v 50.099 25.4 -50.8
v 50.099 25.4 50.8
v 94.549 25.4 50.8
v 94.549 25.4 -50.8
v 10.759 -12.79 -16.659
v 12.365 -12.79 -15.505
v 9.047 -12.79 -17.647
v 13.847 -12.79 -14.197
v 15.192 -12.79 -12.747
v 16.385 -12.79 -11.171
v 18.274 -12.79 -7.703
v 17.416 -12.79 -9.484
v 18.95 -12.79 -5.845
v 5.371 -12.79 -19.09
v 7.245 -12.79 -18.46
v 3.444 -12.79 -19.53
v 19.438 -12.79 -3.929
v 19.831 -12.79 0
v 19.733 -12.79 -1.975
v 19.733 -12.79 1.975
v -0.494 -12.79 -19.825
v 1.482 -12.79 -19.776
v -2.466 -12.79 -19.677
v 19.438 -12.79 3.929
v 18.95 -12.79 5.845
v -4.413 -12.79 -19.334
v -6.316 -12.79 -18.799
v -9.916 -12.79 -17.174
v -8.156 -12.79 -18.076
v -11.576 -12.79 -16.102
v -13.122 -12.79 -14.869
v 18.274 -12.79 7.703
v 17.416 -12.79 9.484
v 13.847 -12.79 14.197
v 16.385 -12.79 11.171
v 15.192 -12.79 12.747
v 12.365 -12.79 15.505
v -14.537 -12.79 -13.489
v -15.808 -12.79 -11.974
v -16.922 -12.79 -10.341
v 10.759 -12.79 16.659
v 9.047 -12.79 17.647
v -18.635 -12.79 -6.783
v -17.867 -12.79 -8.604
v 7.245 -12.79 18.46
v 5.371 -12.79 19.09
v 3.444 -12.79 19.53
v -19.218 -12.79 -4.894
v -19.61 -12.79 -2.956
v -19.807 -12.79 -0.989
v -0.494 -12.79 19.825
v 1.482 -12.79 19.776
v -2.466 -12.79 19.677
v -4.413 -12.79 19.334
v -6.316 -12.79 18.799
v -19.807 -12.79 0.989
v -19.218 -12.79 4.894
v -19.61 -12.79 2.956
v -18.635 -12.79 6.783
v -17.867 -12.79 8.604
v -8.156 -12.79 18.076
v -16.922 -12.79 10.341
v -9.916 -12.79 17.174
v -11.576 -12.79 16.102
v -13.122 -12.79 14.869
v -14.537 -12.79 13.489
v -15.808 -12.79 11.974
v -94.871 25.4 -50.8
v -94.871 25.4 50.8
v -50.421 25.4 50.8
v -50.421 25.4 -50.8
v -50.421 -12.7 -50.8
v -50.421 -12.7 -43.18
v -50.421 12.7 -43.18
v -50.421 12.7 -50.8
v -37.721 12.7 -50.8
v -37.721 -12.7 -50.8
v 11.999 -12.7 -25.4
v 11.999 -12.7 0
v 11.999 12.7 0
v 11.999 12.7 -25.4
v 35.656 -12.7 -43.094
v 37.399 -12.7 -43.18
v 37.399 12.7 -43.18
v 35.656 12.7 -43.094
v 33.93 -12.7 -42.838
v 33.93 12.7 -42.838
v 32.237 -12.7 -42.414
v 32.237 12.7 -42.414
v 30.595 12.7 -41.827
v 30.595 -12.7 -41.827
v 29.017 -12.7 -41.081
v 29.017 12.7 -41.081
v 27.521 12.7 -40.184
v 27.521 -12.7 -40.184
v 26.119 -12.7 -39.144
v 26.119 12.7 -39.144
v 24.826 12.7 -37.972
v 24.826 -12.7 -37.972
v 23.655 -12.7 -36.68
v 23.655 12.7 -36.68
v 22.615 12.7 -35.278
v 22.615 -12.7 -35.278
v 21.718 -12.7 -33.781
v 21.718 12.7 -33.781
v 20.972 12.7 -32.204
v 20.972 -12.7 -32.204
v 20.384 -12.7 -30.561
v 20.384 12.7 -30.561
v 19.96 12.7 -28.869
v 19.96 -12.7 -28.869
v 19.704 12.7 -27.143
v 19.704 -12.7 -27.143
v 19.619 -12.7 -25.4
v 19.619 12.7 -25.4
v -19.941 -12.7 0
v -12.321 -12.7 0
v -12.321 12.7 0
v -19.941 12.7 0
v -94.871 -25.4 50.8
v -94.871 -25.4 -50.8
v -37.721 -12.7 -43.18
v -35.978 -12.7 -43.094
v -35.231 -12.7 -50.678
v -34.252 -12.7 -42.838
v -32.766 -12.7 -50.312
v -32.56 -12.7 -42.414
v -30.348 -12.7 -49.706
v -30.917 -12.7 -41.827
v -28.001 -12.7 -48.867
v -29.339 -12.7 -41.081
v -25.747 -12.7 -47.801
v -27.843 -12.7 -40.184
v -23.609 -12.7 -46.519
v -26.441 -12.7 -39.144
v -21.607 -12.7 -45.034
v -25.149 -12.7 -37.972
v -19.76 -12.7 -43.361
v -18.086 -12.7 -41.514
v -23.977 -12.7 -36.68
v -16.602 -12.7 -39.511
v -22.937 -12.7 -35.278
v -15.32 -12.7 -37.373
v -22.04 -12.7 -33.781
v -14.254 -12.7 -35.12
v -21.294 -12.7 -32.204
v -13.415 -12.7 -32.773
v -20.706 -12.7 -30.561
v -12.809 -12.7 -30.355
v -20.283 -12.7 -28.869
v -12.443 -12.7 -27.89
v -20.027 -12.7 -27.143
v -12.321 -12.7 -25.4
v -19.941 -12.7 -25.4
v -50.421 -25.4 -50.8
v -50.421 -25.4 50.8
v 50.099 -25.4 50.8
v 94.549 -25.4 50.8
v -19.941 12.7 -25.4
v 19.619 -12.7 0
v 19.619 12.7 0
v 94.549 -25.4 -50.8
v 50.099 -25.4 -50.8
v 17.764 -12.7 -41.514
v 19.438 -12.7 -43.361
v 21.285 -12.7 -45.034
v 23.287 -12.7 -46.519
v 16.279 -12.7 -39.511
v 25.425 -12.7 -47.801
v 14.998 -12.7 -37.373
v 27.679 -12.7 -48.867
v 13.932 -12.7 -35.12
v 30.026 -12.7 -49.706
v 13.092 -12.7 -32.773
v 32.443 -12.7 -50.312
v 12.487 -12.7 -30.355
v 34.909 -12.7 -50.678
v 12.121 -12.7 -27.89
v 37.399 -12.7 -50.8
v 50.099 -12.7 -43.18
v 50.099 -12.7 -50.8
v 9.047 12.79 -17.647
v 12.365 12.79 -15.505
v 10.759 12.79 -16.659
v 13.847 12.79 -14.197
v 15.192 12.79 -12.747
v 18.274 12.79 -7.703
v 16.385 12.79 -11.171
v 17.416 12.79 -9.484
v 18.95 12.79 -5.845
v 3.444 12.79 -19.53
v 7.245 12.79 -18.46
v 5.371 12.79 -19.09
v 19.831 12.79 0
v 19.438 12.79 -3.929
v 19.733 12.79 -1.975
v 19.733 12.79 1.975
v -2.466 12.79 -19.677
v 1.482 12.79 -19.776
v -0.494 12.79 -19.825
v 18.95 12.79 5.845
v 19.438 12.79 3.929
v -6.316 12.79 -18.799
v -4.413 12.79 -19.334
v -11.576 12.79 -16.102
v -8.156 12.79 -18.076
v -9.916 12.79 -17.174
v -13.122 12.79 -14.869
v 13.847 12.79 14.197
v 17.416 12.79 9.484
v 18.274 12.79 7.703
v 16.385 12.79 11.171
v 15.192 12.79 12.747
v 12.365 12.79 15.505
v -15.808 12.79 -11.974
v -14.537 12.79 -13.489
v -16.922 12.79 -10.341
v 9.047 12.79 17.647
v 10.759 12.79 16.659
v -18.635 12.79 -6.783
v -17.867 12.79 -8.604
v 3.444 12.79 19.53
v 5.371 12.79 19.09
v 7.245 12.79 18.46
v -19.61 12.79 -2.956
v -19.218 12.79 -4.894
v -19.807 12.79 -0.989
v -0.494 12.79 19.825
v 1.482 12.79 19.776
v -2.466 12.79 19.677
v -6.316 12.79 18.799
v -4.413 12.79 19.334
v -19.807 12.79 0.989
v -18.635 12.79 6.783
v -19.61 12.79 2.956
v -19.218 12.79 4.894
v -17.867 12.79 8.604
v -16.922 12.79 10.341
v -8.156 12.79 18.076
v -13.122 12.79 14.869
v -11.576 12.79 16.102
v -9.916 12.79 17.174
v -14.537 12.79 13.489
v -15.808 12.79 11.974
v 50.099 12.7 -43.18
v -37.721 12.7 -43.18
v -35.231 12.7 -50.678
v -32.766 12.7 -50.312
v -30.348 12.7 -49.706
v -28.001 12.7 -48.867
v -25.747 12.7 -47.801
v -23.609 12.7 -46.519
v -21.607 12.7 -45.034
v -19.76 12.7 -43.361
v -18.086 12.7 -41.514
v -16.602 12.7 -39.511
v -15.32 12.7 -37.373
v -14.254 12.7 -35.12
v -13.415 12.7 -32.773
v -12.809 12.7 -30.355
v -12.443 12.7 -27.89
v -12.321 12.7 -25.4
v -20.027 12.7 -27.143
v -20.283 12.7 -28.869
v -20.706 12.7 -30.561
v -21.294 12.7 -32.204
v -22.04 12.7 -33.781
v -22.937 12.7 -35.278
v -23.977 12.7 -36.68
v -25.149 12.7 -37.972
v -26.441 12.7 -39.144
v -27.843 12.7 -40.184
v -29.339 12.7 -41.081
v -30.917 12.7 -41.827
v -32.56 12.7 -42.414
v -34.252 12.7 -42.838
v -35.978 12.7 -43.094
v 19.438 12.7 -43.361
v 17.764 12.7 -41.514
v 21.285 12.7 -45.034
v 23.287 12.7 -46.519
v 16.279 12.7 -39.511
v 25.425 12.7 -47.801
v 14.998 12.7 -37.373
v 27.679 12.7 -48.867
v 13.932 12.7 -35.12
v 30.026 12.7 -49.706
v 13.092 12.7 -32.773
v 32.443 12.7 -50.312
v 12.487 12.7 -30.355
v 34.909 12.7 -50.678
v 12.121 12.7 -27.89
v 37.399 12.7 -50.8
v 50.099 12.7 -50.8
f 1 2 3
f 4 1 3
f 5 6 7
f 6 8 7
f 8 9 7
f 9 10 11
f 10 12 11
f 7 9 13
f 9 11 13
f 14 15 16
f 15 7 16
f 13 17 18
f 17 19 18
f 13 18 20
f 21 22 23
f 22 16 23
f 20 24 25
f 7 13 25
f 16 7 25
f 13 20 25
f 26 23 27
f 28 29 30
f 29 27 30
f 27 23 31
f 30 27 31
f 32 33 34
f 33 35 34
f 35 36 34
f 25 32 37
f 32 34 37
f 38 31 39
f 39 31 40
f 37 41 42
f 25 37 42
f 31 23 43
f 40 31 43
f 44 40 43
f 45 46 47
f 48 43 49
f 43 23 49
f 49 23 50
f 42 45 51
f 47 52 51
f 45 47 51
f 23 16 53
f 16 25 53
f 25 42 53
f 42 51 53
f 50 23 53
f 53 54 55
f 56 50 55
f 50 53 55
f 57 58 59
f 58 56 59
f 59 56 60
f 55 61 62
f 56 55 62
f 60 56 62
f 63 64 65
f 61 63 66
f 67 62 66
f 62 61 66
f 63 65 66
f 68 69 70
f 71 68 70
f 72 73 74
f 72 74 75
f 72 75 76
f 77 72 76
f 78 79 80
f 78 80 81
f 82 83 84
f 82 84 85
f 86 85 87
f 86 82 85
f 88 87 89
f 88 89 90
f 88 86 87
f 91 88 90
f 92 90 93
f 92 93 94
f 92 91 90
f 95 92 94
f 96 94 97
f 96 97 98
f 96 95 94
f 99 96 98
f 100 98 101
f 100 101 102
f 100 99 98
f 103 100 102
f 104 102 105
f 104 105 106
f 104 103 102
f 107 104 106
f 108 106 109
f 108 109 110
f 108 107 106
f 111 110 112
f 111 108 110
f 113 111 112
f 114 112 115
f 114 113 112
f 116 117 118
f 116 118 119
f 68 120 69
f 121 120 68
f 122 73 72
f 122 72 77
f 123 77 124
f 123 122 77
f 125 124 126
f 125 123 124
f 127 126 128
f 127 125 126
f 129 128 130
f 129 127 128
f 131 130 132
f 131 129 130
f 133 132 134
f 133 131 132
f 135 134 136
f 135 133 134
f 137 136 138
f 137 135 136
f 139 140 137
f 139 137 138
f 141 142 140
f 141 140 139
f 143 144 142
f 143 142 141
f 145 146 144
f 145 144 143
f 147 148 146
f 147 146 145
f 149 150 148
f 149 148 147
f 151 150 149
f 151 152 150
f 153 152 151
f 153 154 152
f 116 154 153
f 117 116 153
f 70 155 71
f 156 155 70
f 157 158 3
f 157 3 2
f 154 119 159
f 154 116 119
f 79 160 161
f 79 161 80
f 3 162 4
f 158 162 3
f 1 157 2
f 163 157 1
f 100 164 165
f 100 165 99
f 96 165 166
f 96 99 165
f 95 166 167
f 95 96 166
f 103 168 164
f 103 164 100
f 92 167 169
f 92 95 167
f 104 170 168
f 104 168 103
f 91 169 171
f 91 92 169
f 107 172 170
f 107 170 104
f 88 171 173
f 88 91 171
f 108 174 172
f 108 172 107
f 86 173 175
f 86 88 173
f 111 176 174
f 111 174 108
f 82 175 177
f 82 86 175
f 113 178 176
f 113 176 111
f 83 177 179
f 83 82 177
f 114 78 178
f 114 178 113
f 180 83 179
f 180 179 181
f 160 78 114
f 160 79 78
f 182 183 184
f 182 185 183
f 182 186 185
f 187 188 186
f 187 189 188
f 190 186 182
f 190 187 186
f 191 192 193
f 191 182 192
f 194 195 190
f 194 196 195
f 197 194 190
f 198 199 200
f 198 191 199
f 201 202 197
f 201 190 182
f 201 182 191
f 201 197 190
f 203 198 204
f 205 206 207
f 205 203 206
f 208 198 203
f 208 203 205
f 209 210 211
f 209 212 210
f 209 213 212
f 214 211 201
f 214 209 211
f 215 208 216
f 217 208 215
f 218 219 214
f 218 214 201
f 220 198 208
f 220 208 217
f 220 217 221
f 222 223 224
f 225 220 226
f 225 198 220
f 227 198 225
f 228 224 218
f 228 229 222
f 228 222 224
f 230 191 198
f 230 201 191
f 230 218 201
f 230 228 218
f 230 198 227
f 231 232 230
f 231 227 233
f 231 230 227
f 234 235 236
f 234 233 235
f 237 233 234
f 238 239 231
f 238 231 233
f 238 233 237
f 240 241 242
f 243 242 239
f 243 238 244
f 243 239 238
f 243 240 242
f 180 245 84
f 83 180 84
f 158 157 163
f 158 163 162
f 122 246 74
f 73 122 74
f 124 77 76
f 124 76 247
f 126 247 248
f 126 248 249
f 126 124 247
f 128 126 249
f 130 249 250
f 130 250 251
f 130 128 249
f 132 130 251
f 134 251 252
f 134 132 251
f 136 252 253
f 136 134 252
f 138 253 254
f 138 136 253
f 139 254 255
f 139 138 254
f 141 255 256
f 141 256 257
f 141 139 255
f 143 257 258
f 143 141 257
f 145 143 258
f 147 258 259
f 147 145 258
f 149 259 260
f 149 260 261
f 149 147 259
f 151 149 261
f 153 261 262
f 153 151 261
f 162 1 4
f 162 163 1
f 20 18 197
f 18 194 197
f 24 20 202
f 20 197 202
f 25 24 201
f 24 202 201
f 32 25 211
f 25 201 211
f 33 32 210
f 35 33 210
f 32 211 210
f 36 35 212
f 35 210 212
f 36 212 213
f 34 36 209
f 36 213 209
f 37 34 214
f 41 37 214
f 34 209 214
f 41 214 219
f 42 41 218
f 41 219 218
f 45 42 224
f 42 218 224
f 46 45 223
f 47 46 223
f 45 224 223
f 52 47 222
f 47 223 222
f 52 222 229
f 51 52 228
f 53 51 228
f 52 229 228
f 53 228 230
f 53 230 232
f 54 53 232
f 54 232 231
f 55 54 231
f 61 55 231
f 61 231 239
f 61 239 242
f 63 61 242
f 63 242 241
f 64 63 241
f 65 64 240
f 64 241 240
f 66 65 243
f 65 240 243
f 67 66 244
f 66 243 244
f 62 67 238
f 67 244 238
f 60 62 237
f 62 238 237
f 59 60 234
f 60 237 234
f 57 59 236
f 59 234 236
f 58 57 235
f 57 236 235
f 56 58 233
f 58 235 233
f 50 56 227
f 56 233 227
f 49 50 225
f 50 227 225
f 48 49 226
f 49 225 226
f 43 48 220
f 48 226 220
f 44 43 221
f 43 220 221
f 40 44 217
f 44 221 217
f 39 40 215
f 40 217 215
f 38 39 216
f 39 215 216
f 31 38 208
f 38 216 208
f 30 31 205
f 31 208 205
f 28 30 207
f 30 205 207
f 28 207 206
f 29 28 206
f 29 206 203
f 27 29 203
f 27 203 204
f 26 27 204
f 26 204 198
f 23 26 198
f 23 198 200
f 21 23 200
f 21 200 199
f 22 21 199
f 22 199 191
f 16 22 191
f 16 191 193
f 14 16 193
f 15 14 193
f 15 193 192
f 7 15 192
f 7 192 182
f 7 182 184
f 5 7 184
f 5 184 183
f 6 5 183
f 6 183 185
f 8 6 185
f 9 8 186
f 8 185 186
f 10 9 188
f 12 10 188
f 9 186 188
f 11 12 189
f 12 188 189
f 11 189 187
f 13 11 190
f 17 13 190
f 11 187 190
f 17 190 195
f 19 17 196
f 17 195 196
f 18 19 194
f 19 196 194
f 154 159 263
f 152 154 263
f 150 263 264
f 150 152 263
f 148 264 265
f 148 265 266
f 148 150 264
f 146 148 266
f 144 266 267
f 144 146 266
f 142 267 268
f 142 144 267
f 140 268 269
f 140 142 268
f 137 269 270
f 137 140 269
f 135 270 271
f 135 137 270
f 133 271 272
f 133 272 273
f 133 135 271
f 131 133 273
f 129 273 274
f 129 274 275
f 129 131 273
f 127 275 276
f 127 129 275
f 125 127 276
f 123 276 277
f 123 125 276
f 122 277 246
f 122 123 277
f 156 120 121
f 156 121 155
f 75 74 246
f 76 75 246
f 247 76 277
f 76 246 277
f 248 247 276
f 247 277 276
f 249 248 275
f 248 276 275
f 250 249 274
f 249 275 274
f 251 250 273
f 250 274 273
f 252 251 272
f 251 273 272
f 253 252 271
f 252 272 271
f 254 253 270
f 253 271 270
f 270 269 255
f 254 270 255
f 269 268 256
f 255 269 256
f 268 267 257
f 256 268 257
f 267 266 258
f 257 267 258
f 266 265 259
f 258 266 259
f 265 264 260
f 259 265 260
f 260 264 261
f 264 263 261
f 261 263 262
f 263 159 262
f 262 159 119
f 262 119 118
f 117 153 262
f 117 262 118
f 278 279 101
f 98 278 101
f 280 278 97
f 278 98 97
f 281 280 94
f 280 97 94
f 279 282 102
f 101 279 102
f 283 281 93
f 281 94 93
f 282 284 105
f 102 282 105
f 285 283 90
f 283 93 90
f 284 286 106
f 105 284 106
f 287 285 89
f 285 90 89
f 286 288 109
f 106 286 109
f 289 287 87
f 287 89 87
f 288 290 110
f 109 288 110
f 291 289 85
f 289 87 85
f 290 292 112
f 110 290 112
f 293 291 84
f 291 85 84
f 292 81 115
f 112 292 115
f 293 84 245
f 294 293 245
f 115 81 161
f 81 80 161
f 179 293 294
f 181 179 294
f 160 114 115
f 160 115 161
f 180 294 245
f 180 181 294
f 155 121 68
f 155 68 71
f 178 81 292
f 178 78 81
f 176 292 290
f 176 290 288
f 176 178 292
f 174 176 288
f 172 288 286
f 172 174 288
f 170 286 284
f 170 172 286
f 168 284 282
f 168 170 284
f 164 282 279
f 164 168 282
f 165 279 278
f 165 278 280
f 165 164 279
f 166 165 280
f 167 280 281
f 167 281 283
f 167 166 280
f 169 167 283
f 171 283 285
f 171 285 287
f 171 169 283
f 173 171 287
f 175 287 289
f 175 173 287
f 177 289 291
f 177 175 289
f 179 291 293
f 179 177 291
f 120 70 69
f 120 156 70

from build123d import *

# Parameters (mm, degrees)
F1_DEPTH = 25.4
F2_DEPTH = 12.7
F3_W     = 19.8312886059
F3_H     = 25.5796890706


with BuildPart() as f1:
    # F0 (on Front) → F1 (new body, symmetric)
    with BuildSketch(Plane.XZ):
        Polygon((-50.42089539, 50.8), (-94.87089539, 50.8), (-94.87089539, -50.8), (-50.42089539, -50.8), (-50.42089539, -43.18), align=None)
    extrude(amount=F1_DEPTH, both=True)


with BuildPart() as f1b:
    # F0 (on Front) → F1, piece 2 (new body, symmetric)
    with BuildSketch(Plane.XZ):
        Polygon((94.5487486538, -50.8), (94.5487486538, 50.8), (50.0987486538, 50.8), (50.0987486538, -43.18), (50.0987486538, -50.8), align=None)
    extrude(amount=F1_DEPTH, both=True)


with BuildPart() as f2:
    # F0 (on Front) → F2 (new body, symmetric)
    with BuildSketch(Plane.XZ):
        with BuildLine():
            Line((-37.72089539, -43.18), (-50.42089539, -43.18))
            Line((-50.42089539, -43.18), (-50.42089539, -50.8))
            Line((-50.42089539, -50.8), (-37.72089539, -50.8))
            ThreePointArc((-37.72089539, -50.8), (-19.7603831478, -43.3605122421), (-12.32089539, -25.4))
            Line((-12.32089539, -25.4), (-12.32089539, 0))
            Line((-12.32089539, 0), (-19.94089539, 0))
            Line((-19.94089539, 0), (-19.94089539, -25.4))
            ThreePointArc((-19.94089539, -25.4), (-25.1485368205, -37.9723585695), (-37.72089539, -43.18))
        make_face()
    extrude(amount=F2_DEPTH, both=True)


with BuildPart() as f2b:
    # F0 (on Front) → F2, piece 2 (new body, symmetric)
    with BuildSketch(Plane.XZ):
        with BuildLine():
            Line((50.0987486538, -50.8), (50.0987486538, -43.18))
            Line((50.0987486538, -43.18), (37.3987486538, -43.18))
            ThreePointArc((37.3987486538, -43.18), (24.8263900843, -37.9723585695), (19.6187486538, -25.4))
            Line((19.6187486538, -25.4), (19.6187486538, 0))
            Line((19.6187486538, 0), (11.9987486538, 0))
            Line((11.9987486538, 0), (11.9987486538, -25.4))
            ThreePointArc((11.9987486538, -25.4), (19.4382364117, -43.3605122421), (37.3987486538, -50.8))
            Line((37.3987486538, -50.8), (50.0987486538, -50.8))
        make_face()
    extrude(amount=F2_DEPTH, both=True)


with BuildPart() as f4:
    # F3 (on Top) → F4 (revolve)
    with BuildSketch(Plane.XY):
        with Locations((9.915644303, 0)):
            Rectangle(F3_W, F3_H)
    revolve(axis=Axis((0, 0, 0), (0, -1, 0)))


solid = Compound([f1.part, f1b.part, f2.part, f2b.part, f4.part])
